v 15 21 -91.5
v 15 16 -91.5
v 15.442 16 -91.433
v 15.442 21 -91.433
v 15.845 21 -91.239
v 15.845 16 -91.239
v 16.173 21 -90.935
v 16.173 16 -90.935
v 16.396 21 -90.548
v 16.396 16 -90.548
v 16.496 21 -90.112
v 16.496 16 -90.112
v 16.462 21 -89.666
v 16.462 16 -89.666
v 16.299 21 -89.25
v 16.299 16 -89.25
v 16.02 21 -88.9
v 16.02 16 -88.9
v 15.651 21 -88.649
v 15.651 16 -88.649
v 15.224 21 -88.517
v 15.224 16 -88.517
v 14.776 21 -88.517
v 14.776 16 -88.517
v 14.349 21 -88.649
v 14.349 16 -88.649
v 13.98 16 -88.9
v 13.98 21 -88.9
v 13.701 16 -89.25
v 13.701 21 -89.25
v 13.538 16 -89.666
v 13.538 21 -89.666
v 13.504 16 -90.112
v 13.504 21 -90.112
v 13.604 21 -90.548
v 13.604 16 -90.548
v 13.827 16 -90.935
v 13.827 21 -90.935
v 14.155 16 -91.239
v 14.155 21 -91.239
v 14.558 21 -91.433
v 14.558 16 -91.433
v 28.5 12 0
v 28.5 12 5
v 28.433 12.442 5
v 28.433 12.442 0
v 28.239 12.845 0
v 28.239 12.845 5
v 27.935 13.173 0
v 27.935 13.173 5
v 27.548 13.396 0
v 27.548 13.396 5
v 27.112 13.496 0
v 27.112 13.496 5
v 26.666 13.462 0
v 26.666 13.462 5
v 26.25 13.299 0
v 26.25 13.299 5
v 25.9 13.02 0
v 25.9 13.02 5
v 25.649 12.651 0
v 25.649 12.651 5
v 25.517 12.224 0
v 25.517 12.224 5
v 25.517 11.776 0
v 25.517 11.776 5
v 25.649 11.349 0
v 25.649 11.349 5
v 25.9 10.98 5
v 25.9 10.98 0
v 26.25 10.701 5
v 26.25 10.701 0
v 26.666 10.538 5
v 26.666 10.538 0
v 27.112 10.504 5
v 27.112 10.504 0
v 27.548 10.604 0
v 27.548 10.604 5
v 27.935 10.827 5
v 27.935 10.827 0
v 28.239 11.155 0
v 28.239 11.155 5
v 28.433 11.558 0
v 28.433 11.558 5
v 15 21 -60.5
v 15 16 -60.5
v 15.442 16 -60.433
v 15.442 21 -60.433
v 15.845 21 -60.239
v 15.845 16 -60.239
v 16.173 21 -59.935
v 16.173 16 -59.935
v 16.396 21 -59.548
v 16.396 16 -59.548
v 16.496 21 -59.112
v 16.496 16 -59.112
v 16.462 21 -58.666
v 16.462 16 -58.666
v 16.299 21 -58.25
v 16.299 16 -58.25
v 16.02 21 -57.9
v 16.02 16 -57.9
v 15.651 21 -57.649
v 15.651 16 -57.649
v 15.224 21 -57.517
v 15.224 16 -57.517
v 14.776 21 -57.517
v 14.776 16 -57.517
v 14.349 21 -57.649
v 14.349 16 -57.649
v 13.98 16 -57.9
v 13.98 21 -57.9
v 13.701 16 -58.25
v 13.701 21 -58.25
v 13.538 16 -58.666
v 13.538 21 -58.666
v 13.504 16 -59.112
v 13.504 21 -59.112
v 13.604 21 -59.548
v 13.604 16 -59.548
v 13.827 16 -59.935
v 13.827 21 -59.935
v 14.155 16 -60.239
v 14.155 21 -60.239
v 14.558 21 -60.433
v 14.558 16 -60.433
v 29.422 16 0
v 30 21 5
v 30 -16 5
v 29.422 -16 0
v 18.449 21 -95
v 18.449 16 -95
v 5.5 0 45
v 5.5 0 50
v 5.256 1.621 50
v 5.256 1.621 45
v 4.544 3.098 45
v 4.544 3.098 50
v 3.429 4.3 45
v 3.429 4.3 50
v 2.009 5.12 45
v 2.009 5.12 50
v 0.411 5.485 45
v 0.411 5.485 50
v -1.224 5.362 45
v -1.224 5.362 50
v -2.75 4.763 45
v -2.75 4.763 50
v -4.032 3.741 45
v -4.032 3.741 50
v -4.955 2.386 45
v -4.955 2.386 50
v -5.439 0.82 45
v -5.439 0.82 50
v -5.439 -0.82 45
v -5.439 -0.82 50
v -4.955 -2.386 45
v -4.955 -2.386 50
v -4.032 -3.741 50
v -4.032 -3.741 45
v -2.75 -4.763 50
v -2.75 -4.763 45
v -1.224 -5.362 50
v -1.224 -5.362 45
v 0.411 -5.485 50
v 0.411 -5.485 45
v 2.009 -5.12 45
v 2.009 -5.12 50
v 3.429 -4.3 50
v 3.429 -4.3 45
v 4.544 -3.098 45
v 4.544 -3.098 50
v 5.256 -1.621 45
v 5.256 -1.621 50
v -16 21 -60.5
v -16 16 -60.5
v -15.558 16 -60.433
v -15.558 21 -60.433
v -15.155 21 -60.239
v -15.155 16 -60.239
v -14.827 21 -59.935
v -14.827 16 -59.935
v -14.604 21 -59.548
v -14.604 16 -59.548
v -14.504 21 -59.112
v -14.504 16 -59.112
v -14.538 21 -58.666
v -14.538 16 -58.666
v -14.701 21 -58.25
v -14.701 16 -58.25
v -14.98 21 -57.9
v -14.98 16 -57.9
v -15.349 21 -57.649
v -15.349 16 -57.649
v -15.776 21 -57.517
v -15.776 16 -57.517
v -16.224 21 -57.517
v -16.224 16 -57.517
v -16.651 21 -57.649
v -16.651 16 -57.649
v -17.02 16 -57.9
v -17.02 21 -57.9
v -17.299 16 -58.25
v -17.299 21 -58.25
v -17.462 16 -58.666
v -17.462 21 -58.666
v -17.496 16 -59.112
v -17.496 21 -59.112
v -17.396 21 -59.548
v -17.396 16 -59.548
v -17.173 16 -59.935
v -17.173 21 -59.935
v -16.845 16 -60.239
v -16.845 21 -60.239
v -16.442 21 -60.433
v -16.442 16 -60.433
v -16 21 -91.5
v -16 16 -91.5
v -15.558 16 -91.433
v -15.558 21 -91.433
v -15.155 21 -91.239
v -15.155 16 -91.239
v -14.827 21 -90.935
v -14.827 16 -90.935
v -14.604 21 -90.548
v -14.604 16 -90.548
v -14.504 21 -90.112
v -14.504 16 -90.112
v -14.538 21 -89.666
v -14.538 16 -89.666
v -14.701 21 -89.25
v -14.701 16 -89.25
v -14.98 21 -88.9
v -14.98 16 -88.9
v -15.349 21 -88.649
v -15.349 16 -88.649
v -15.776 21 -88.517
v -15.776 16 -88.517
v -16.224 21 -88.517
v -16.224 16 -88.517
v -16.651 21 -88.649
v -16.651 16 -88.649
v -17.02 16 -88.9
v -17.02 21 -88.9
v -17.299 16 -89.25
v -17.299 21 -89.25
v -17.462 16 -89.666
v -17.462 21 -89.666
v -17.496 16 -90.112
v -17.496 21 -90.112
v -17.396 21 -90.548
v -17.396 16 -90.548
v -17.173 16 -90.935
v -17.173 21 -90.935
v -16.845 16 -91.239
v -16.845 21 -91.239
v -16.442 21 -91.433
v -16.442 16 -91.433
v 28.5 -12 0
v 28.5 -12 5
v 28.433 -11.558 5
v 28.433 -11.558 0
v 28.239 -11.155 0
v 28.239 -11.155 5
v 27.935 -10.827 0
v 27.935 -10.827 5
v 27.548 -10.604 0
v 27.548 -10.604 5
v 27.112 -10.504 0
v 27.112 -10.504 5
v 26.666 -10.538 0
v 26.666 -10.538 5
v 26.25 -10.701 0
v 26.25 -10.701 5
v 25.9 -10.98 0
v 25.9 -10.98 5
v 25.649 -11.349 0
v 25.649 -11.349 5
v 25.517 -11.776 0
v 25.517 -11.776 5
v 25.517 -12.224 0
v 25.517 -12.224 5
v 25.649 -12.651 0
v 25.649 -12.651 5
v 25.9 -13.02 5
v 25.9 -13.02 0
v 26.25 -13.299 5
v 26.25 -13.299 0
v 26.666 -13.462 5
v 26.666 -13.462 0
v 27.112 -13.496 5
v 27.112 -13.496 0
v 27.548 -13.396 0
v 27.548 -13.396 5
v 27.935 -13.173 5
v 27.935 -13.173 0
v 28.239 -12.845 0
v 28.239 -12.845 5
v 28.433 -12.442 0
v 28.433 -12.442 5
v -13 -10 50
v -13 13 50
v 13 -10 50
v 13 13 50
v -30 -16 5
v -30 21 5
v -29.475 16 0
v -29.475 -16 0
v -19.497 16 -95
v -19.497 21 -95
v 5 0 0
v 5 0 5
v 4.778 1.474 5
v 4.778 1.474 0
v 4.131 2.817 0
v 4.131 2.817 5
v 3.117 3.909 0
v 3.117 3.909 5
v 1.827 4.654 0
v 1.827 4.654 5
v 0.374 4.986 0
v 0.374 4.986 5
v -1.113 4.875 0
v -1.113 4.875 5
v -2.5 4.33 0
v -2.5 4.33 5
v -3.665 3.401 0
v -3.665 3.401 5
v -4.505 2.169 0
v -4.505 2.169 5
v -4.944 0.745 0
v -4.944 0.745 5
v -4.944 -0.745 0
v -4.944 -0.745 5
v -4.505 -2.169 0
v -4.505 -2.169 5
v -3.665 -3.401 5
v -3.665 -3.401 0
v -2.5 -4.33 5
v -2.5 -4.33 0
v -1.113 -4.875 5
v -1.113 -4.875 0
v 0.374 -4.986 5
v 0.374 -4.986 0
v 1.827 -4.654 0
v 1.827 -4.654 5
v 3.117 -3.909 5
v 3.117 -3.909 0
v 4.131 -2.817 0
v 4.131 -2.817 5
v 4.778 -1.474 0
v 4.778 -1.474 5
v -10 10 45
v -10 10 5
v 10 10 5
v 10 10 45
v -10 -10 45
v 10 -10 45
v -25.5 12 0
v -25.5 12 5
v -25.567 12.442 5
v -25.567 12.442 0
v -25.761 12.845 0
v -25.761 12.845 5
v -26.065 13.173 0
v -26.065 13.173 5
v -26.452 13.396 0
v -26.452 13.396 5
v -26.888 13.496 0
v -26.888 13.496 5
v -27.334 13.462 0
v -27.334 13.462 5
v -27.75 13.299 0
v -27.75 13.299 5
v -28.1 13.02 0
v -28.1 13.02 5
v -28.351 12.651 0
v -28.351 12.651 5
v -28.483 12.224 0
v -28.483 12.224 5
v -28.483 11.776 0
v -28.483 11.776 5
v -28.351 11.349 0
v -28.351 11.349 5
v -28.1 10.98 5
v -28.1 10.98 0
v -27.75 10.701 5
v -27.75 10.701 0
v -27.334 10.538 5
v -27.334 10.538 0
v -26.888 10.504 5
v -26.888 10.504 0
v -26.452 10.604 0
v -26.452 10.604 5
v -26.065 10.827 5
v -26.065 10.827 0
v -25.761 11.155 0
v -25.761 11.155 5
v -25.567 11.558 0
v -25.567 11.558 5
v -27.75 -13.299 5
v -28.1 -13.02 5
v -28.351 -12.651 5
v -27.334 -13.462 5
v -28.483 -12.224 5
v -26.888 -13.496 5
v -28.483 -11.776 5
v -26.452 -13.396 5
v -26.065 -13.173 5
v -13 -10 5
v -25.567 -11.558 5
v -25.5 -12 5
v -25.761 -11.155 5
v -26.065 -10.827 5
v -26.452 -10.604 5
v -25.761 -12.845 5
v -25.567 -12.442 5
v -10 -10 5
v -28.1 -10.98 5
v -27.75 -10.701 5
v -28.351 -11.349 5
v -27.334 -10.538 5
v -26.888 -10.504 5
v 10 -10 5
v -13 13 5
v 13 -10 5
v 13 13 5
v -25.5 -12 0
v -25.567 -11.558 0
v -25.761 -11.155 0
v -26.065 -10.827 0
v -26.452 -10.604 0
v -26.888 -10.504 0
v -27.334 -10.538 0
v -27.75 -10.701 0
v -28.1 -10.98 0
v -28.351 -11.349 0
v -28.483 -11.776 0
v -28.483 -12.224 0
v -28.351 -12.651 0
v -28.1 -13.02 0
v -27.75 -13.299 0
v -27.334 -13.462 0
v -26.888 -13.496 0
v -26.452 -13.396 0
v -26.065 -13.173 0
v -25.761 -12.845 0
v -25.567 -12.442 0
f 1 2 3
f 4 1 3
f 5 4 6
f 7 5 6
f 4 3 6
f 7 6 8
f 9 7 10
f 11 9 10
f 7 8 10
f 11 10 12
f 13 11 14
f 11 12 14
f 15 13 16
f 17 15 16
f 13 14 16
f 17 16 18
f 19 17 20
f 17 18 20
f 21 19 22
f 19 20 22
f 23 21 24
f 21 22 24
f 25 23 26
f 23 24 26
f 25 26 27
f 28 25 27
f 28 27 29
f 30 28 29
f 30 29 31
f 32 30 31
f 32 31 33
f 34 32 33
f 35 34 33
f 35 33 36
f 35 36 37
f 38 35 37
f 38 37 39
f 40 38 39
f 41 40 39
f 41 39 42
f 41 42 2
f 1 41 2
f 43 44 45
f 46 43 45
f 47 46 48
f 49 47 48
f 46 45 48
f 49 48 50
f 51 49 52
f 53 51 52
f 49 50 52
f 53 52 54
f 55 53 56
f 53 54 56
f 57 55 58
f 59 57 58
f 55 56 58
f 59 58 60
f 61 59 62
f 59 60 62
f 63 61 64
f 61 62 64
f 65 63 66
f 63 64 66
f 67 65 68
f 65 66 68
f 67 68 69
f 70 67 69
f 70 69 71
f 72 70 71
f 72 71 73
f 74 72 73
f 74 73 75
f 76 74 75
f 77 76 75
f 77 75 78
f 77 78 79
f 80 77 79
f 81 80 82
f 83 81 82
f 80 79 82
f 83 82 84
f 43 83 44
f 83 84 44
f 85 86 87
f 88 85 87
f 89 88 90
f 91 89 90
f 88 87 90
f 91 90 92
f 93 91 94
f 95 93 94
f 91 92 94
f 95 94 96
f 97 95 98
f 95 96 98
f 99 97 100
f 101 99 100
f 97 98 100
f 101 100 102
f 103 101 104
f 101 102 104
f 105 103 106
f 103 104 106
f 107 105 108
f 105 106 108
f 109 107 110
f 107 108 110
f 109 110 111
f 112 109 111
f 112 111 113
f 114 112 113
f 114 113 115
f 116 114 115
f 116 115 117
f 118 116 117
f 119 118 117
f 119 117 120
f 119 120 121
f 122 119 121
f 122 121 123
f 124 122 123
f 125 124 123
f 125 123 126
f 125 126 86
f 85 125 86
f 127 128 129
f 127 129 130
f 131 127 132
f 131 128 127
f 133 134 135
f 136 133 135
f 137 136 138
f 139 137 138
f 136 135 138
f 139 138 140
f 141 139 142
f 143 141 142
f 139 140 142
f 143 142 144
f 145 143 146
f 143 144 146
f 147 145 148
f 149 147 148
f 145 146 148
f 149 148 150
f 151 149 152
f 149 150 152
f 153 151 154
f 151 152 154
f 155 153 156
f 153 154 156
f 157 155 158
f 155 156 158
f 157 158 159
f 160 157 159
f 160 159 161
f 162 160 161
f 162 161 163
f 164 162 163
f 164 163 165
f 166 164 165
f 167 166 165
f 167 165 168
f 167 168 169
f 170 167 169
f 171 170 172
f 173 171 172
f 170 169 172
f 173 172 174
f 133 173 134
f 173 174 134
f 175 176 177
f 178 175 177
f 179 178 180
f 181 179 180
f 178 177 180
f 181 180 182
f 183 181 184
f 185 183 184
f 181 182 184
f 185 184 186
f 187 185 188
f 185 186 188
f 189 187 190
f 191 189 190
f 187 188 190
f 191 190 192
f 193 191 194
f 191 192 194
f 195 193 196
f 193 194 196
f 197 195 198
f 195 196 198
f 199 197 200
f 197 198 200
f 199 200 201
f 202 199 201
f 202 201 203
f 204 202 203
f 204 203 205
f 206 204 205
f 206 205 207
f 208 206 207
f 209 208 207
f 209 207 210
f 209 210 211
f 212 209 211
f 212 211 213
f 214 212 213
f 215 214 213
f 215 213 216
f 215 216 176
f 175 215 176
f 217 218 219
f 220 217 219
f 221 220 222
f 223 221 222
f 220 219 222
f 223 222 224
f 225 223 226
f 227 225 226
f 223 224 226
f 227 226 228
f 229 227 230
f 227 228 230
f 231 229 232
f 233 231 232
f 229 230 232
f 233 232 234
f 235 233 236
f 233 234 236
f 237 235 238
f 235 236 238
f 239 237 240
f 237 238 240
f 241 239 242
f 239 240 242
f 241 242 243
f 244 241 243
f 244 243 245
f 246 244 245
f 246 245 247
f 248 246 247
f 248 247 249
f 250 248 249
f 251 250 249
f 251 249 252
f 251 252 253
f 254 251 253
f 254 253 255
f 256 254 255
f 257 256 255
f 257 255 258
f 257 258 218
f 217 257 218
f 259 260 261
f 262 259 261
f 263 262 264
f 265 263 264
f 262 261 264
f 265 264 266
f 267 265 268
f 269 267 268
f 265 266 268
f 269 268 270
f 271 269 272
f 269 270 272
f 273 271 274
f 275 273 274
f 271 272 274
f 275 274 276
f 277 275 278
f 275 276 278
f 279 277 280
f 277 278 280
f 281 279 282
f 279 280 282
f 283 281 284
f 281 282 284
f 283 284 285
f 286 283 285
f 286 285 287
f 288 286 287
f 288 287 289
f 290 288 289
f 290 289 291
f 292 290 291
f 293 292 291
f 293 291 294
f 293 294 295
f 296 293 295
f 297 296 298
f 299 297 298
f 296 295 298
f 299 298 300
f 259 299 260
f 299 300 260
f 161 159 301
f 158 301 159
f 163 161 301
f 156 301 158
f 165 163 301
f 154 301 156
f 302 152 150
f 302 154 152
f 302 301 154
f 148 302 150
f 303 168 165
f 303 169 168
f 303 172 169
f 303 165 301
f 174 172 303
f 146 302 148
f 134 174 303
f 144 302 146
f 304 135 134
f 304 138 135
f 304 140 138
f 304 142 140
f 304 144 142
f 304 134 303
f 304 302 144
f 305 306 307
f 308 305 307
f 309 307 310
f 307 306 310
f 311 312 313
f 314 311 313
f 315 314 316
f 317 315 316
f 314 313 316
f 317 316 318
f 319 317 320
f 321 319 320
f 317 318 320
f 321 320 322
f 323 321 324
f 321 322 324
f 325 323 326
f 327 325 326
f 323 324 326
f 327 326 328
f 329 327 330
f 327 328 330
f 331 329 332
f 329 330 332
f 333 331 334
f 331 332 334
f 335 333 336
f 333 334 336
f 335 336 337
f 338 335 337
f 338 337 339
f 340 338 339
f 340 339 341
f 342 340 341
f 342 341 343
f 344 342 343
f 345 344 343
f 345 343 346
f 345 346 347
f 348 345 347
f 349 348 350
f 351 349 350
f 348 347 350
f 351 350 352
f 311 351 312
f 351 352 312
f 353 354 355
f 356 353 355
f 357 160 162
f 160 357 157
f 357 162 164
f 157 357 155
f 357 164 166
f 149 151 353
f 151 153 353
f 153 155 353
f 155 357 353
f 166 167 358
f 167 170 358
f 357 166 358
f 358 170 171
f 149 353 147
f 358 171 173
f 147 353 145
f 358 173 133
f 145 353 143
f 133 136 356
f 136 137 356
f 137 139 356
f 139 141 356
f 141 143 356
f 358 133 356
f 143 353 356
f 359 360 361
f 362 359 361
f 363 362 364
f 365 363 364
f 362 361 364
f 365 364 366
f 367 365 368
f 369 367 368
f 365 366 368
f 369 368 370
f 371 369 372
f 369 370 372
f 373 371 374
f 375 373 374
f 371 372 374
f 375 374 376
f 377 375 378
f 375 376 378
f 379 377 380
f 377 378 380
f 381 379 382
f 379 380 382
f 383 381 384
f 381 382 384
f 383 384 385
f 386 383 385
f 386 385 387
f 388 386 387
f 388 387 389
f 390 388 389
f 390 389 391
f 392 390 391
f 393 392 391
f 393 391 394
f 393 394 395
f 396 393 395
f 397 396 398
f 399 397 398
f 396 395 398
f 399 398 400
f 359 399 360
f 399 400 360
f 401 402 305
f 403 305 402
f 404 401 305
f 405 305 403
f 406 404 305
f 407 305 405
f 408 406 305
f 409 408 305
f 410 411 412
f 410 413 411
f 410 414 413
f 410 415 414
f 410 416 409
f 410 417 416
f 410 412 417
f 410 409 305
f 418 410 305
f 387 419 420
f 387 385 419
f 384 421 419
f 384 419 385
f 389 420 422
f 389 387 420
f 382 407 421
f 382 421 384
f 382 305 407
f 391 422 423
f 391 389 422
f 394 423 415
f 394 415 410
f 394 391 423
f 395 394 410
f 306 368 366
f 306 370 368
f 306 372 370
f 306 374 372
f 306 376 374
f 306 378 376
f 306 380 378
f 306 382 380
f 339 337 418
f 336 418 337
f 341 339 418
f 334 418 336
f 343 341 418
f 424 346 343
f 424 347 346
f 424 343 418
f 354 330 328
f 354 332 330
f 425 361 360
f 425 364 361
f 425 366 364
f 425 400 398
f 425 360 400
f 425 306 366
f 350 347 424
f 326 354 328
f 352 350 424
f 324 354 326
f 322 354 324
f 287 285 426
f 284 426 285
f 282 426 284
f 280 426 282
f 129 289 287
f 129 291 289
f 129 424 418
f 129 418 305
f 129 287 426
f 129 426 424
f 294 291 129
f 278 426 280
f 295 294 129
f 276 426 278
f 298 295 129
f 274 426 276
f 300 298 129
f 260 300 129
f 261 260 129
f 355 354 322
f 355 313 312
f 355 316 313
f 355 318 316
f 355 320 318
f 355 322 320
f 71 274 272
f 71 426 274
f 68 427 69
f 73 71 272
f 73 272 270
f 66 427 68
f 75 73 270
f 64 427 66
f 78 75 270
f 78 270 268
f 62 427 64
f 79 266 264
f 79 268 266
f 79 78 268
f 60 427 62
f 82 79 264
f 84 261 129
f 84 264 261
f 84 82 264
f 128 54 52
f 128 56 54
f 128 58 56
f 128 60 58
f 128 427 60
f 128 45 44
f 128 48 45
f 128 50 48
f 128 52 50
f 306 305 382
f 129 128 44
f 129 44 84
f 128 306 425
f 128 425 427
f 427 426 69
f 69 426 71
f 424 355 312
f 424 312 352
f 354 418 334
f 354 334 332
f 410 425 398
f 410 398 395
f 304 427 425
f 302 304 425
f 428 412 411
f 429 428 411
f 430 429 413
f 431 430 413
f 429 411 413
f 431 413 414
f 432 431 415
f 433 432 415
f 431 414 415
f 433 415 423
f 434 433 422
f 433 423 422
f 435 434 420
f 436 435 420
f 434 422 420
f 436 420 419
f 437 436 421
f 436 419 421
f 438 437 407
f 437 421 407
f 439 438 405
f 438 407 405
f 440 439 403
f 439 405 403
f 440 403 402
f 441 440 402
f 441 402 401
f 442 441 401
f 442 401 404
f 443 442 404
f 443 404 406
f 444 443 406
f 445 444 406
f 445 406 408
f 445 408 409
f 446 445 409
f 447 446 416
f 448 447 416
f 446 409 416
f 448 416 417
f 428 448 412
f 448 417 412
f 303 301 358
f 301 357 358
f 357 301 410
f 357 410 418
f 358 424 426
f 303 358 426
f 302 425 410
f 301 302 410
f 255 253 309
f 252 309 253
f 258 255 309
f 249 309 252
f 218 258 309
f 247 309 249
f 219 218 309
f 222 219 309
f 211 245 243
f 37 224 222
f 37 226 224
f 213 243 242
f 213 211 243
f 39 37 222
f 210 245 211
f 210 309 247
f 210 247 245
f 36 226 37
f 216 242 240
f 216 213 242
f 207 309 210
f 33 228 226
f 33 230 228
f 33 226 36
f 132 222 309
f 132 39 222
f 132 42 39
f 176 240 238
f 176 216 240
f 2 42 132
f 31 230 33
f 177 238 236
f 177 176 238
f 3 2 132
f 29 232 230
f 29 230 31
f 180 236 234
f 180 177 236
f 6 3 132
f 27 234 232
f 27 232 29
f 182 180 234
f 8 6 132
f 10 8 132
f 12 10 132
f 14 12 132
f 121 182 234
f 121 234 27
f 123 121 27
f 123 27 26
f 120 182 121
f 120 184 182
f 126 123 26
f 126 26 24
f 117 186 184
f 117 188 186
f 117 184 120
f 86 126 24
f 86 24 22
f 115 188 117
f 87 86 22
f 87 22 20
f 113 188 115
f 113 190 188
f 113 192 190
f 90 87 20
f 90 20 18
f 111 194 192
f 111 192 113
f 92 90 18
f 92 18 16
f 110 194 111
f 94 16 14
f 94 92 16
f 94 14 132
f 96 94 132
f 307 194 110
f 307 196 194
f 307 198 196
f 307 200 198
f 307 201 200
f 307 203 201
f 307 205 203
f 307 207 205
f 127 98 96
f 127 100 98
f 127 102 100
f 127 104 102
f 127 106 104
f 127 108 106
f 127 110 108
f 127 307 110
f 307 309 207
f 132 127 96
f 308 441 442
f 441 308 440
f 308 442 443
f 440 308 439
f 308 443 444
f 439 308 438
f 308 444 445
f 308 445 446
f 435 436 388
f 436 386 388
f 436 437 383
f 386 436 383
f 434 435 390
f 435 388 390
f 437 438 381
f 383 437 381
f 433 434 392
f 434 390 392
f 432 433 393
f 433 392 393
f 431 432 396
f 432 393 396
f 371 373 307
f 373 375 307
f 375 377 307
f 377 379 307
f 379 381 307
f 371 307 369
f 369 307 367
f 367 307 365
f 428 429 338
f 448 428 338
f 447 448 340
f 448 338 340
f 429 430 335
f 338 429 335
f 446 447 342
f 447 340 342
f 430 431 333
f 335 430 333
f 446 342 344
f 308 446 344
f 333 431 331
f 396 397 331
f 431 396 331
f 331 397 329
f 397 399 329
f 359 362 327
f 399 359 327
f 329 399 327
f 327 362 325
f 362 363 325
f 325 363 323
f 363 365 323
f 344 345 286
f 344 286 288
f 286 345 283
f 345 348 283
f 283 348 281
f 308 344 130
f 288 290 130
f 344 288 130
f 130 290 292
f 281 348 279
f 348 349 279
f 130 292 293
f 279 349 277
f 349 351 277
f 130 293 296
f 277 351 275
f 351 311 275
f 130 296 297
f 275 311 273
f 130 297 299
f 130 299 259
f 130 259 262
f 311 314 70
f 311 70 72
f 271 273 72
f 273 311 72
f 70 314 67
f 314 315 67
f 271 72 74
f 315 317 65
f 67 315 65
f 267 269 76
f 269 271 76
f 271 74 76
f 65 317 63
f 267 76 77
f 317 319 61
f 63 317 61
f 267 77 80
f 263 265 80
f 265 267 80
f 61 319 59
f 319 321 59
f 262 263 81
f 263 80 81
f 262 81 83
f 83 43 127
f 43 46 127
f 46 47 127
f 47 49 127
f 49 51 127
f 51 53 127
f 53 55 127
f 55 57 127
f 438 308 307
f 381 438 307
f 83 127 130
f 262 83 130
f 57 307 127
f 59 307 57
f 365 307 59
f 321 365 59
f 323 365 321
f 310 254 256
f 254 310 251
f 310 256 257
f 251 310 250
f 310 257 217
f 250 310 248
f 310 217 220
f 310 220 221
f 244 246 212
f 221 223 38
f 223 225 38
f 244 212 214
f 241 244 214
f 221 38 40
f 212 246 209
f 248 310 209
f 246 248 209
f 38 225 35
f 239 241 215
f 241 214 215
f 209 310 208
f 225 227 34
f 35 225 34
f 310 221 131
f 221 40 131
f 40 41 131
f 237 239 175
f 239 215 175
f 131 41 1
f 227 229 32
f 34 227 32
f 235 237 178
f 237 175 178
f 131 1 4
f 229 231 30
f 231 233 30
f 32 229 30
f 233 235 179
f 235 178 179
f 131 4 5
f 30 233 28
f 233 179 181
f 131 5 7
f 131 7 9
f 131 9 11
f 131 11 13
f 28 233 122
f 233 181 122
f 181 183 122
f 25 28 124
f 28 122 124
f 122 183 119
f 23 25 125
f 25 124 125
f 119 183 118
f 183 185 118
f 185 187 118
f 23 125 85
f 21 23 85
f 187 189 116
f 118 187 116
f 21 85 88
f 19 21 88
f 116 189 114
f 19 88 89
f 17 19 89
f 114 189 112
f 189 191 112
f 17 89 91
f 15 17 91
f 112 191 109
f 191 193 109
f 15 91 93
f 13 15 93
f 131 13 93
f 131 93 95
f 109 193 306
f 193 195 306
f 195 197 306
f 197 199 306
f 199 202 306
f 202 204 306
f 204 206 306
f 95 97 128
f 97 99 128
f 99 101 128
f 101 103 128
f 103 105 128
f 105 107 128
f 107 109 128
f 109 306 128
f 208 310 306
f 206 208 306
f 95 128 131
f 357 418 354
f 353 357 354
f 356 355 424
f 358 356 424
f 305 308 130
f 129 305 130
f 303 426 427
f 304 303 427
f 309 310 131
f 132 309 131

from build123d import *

# Parameters (mm, degrees)
SKETCH1_W           = 60
SKETCH1_H           = 32
BOSS_EXTRUDE1_DEPTH = 5
SKETCH2_R           = 1.5
CUT_EXTRUDE1_DEPTH  = 5
SKETCH4_R           = 5
CUT_EXTRUDE2_DEPTH  = 5
SKETCH5_W           = 60
SKETCH5_H           = 5
BOSS_EXTRUDE2_DEPTH = 100
SKETCH6_R           = 1.5
CUT_EXTRUDE3_DEPTH  = 100
CUT_EXTRUDE4_DEPTH  = 100
BOSS_EXTRUDE3_DEPTH = 45
SKETCH9_W           = 26
SKETCH9_H           = 23
BOSS_EXTRUDE4_DEPTH = 5
SKETCH10_R          = 5.5
CUT_EXTRUDE5_DEPTH  = 5


with BuildPart() as part:
    # Sketch1 → Boss-Extrude1 (new body)
    with BuildSketch(Plane.XY):
        Rectangle(SKETCH1_W, SKETCH1_H)
    extrude(amount=BOSS_EXTRUDE1_DEPTH)

    # Sketch2 → Cut-Extrude1 (cut)
    with BuildSketch(Plane.XY.offset(5)):
        with Locations((27, 12)):
            Circle(SKETCH2_R)
        with Locations((27, -12)):
            Circle(SKETCH2_R)
        with Locations((-27, -12)):
            Circle(SKETCH2_R)
        with Locations((-27, 12)):
            Circle(SKETCH2_R)
    extrude(amount=-CUT_EXTRUDE1_DEPTH, mode=Mode.SUBTRACT)

    # Sketch4 → Cut-Extrude2 (cut)
    with BuildSketch(Plane.XY.offset(5)):
        Circle(SKETCH4_R)
    extrude(amount=-CUT_EXTRUDE2_DEPTH, mode=Mode.SUBTRACT)

    # Sketch5 → Boss-Extrude2 (add)
    with BuildSketch(Plane.XY.offset(5)):
        with Locations((0, 18.5)):
            Rectangle(SKETCH5_W, SKETCH5_H)
    extrude(amount=-BOSS_EXTRUDE2_DEPTH)

    # Sketch6 → Cut-Extrude3 (cut)
    with BuildSketch(Plane.XZ.offset(-16)):
        with Locations(Location((15, -59, 0), (0, 0, 270))):
            Circle(SKETCH6_R)
        with Locations(Location((-16, -59, 0), (0, 0, 270))):
            Circle(SKETCH6_R)
        with Locations(Location((15, -90, 0), (0, 0, 270))):
            Circle(SKETCH6_R)
        with Locations(Location((-16, -90, 0), (0, 0, 270))):
            Circle(SKETCH6_R)
    extrude(amount=-CUT_EXTRUDE3_DEPTH, mode=Mode.SUBTRACT)

    # Sketch7 → Cut-Extrude4 (cut)
    with BuildSketch(Plane(origin=(0, 21, 0), x_dir=(1, 0, 0), z_dir=(0, 1, 0))):
        Polygon((30, -5), (18.449048919, 95), (30, 95), align=None)
        Polygon((-30, -5), (-19.496844987, 95), (-30, 95), align=None)
    extrude(amount=-CUT_EXTRUDE4_DEPTH, mode=Mode.SUBTRACT)

    # Sketch8 → Boss-Extrude3 (add)
    with BuildSketch(Plane.XY.offset(5)):
        Polygon((13, 13), (-13, 13), (-13, -10), (-10, -10), (-10, 10), (10, 10), (10, -10), (13, -10), align=None)
    extrude(amount=BOSS_EXTRUDE3_DEPTH)

    # Sketch9 → Boss-Extrude4 (add)
    with BuildSketch(Plane.XY.offset(50)):
        with Locations((0, 1.5)):
            Rectangle(SKETCH9_W, SKETCH9_H)
    extrude(amount=-BOSS_EXTRUDE4_DEPTH)

    # Sketch10 → Cut-Extrude5 (cut)
    with BuildSketch(Plane.XY.offset(50)):
        Circle(SKETCH10_R)
    extrude(amount=-CUT_EXTRUDE5_DEPTH, mode=Mode.SUBTRACT)


solid = part.part
